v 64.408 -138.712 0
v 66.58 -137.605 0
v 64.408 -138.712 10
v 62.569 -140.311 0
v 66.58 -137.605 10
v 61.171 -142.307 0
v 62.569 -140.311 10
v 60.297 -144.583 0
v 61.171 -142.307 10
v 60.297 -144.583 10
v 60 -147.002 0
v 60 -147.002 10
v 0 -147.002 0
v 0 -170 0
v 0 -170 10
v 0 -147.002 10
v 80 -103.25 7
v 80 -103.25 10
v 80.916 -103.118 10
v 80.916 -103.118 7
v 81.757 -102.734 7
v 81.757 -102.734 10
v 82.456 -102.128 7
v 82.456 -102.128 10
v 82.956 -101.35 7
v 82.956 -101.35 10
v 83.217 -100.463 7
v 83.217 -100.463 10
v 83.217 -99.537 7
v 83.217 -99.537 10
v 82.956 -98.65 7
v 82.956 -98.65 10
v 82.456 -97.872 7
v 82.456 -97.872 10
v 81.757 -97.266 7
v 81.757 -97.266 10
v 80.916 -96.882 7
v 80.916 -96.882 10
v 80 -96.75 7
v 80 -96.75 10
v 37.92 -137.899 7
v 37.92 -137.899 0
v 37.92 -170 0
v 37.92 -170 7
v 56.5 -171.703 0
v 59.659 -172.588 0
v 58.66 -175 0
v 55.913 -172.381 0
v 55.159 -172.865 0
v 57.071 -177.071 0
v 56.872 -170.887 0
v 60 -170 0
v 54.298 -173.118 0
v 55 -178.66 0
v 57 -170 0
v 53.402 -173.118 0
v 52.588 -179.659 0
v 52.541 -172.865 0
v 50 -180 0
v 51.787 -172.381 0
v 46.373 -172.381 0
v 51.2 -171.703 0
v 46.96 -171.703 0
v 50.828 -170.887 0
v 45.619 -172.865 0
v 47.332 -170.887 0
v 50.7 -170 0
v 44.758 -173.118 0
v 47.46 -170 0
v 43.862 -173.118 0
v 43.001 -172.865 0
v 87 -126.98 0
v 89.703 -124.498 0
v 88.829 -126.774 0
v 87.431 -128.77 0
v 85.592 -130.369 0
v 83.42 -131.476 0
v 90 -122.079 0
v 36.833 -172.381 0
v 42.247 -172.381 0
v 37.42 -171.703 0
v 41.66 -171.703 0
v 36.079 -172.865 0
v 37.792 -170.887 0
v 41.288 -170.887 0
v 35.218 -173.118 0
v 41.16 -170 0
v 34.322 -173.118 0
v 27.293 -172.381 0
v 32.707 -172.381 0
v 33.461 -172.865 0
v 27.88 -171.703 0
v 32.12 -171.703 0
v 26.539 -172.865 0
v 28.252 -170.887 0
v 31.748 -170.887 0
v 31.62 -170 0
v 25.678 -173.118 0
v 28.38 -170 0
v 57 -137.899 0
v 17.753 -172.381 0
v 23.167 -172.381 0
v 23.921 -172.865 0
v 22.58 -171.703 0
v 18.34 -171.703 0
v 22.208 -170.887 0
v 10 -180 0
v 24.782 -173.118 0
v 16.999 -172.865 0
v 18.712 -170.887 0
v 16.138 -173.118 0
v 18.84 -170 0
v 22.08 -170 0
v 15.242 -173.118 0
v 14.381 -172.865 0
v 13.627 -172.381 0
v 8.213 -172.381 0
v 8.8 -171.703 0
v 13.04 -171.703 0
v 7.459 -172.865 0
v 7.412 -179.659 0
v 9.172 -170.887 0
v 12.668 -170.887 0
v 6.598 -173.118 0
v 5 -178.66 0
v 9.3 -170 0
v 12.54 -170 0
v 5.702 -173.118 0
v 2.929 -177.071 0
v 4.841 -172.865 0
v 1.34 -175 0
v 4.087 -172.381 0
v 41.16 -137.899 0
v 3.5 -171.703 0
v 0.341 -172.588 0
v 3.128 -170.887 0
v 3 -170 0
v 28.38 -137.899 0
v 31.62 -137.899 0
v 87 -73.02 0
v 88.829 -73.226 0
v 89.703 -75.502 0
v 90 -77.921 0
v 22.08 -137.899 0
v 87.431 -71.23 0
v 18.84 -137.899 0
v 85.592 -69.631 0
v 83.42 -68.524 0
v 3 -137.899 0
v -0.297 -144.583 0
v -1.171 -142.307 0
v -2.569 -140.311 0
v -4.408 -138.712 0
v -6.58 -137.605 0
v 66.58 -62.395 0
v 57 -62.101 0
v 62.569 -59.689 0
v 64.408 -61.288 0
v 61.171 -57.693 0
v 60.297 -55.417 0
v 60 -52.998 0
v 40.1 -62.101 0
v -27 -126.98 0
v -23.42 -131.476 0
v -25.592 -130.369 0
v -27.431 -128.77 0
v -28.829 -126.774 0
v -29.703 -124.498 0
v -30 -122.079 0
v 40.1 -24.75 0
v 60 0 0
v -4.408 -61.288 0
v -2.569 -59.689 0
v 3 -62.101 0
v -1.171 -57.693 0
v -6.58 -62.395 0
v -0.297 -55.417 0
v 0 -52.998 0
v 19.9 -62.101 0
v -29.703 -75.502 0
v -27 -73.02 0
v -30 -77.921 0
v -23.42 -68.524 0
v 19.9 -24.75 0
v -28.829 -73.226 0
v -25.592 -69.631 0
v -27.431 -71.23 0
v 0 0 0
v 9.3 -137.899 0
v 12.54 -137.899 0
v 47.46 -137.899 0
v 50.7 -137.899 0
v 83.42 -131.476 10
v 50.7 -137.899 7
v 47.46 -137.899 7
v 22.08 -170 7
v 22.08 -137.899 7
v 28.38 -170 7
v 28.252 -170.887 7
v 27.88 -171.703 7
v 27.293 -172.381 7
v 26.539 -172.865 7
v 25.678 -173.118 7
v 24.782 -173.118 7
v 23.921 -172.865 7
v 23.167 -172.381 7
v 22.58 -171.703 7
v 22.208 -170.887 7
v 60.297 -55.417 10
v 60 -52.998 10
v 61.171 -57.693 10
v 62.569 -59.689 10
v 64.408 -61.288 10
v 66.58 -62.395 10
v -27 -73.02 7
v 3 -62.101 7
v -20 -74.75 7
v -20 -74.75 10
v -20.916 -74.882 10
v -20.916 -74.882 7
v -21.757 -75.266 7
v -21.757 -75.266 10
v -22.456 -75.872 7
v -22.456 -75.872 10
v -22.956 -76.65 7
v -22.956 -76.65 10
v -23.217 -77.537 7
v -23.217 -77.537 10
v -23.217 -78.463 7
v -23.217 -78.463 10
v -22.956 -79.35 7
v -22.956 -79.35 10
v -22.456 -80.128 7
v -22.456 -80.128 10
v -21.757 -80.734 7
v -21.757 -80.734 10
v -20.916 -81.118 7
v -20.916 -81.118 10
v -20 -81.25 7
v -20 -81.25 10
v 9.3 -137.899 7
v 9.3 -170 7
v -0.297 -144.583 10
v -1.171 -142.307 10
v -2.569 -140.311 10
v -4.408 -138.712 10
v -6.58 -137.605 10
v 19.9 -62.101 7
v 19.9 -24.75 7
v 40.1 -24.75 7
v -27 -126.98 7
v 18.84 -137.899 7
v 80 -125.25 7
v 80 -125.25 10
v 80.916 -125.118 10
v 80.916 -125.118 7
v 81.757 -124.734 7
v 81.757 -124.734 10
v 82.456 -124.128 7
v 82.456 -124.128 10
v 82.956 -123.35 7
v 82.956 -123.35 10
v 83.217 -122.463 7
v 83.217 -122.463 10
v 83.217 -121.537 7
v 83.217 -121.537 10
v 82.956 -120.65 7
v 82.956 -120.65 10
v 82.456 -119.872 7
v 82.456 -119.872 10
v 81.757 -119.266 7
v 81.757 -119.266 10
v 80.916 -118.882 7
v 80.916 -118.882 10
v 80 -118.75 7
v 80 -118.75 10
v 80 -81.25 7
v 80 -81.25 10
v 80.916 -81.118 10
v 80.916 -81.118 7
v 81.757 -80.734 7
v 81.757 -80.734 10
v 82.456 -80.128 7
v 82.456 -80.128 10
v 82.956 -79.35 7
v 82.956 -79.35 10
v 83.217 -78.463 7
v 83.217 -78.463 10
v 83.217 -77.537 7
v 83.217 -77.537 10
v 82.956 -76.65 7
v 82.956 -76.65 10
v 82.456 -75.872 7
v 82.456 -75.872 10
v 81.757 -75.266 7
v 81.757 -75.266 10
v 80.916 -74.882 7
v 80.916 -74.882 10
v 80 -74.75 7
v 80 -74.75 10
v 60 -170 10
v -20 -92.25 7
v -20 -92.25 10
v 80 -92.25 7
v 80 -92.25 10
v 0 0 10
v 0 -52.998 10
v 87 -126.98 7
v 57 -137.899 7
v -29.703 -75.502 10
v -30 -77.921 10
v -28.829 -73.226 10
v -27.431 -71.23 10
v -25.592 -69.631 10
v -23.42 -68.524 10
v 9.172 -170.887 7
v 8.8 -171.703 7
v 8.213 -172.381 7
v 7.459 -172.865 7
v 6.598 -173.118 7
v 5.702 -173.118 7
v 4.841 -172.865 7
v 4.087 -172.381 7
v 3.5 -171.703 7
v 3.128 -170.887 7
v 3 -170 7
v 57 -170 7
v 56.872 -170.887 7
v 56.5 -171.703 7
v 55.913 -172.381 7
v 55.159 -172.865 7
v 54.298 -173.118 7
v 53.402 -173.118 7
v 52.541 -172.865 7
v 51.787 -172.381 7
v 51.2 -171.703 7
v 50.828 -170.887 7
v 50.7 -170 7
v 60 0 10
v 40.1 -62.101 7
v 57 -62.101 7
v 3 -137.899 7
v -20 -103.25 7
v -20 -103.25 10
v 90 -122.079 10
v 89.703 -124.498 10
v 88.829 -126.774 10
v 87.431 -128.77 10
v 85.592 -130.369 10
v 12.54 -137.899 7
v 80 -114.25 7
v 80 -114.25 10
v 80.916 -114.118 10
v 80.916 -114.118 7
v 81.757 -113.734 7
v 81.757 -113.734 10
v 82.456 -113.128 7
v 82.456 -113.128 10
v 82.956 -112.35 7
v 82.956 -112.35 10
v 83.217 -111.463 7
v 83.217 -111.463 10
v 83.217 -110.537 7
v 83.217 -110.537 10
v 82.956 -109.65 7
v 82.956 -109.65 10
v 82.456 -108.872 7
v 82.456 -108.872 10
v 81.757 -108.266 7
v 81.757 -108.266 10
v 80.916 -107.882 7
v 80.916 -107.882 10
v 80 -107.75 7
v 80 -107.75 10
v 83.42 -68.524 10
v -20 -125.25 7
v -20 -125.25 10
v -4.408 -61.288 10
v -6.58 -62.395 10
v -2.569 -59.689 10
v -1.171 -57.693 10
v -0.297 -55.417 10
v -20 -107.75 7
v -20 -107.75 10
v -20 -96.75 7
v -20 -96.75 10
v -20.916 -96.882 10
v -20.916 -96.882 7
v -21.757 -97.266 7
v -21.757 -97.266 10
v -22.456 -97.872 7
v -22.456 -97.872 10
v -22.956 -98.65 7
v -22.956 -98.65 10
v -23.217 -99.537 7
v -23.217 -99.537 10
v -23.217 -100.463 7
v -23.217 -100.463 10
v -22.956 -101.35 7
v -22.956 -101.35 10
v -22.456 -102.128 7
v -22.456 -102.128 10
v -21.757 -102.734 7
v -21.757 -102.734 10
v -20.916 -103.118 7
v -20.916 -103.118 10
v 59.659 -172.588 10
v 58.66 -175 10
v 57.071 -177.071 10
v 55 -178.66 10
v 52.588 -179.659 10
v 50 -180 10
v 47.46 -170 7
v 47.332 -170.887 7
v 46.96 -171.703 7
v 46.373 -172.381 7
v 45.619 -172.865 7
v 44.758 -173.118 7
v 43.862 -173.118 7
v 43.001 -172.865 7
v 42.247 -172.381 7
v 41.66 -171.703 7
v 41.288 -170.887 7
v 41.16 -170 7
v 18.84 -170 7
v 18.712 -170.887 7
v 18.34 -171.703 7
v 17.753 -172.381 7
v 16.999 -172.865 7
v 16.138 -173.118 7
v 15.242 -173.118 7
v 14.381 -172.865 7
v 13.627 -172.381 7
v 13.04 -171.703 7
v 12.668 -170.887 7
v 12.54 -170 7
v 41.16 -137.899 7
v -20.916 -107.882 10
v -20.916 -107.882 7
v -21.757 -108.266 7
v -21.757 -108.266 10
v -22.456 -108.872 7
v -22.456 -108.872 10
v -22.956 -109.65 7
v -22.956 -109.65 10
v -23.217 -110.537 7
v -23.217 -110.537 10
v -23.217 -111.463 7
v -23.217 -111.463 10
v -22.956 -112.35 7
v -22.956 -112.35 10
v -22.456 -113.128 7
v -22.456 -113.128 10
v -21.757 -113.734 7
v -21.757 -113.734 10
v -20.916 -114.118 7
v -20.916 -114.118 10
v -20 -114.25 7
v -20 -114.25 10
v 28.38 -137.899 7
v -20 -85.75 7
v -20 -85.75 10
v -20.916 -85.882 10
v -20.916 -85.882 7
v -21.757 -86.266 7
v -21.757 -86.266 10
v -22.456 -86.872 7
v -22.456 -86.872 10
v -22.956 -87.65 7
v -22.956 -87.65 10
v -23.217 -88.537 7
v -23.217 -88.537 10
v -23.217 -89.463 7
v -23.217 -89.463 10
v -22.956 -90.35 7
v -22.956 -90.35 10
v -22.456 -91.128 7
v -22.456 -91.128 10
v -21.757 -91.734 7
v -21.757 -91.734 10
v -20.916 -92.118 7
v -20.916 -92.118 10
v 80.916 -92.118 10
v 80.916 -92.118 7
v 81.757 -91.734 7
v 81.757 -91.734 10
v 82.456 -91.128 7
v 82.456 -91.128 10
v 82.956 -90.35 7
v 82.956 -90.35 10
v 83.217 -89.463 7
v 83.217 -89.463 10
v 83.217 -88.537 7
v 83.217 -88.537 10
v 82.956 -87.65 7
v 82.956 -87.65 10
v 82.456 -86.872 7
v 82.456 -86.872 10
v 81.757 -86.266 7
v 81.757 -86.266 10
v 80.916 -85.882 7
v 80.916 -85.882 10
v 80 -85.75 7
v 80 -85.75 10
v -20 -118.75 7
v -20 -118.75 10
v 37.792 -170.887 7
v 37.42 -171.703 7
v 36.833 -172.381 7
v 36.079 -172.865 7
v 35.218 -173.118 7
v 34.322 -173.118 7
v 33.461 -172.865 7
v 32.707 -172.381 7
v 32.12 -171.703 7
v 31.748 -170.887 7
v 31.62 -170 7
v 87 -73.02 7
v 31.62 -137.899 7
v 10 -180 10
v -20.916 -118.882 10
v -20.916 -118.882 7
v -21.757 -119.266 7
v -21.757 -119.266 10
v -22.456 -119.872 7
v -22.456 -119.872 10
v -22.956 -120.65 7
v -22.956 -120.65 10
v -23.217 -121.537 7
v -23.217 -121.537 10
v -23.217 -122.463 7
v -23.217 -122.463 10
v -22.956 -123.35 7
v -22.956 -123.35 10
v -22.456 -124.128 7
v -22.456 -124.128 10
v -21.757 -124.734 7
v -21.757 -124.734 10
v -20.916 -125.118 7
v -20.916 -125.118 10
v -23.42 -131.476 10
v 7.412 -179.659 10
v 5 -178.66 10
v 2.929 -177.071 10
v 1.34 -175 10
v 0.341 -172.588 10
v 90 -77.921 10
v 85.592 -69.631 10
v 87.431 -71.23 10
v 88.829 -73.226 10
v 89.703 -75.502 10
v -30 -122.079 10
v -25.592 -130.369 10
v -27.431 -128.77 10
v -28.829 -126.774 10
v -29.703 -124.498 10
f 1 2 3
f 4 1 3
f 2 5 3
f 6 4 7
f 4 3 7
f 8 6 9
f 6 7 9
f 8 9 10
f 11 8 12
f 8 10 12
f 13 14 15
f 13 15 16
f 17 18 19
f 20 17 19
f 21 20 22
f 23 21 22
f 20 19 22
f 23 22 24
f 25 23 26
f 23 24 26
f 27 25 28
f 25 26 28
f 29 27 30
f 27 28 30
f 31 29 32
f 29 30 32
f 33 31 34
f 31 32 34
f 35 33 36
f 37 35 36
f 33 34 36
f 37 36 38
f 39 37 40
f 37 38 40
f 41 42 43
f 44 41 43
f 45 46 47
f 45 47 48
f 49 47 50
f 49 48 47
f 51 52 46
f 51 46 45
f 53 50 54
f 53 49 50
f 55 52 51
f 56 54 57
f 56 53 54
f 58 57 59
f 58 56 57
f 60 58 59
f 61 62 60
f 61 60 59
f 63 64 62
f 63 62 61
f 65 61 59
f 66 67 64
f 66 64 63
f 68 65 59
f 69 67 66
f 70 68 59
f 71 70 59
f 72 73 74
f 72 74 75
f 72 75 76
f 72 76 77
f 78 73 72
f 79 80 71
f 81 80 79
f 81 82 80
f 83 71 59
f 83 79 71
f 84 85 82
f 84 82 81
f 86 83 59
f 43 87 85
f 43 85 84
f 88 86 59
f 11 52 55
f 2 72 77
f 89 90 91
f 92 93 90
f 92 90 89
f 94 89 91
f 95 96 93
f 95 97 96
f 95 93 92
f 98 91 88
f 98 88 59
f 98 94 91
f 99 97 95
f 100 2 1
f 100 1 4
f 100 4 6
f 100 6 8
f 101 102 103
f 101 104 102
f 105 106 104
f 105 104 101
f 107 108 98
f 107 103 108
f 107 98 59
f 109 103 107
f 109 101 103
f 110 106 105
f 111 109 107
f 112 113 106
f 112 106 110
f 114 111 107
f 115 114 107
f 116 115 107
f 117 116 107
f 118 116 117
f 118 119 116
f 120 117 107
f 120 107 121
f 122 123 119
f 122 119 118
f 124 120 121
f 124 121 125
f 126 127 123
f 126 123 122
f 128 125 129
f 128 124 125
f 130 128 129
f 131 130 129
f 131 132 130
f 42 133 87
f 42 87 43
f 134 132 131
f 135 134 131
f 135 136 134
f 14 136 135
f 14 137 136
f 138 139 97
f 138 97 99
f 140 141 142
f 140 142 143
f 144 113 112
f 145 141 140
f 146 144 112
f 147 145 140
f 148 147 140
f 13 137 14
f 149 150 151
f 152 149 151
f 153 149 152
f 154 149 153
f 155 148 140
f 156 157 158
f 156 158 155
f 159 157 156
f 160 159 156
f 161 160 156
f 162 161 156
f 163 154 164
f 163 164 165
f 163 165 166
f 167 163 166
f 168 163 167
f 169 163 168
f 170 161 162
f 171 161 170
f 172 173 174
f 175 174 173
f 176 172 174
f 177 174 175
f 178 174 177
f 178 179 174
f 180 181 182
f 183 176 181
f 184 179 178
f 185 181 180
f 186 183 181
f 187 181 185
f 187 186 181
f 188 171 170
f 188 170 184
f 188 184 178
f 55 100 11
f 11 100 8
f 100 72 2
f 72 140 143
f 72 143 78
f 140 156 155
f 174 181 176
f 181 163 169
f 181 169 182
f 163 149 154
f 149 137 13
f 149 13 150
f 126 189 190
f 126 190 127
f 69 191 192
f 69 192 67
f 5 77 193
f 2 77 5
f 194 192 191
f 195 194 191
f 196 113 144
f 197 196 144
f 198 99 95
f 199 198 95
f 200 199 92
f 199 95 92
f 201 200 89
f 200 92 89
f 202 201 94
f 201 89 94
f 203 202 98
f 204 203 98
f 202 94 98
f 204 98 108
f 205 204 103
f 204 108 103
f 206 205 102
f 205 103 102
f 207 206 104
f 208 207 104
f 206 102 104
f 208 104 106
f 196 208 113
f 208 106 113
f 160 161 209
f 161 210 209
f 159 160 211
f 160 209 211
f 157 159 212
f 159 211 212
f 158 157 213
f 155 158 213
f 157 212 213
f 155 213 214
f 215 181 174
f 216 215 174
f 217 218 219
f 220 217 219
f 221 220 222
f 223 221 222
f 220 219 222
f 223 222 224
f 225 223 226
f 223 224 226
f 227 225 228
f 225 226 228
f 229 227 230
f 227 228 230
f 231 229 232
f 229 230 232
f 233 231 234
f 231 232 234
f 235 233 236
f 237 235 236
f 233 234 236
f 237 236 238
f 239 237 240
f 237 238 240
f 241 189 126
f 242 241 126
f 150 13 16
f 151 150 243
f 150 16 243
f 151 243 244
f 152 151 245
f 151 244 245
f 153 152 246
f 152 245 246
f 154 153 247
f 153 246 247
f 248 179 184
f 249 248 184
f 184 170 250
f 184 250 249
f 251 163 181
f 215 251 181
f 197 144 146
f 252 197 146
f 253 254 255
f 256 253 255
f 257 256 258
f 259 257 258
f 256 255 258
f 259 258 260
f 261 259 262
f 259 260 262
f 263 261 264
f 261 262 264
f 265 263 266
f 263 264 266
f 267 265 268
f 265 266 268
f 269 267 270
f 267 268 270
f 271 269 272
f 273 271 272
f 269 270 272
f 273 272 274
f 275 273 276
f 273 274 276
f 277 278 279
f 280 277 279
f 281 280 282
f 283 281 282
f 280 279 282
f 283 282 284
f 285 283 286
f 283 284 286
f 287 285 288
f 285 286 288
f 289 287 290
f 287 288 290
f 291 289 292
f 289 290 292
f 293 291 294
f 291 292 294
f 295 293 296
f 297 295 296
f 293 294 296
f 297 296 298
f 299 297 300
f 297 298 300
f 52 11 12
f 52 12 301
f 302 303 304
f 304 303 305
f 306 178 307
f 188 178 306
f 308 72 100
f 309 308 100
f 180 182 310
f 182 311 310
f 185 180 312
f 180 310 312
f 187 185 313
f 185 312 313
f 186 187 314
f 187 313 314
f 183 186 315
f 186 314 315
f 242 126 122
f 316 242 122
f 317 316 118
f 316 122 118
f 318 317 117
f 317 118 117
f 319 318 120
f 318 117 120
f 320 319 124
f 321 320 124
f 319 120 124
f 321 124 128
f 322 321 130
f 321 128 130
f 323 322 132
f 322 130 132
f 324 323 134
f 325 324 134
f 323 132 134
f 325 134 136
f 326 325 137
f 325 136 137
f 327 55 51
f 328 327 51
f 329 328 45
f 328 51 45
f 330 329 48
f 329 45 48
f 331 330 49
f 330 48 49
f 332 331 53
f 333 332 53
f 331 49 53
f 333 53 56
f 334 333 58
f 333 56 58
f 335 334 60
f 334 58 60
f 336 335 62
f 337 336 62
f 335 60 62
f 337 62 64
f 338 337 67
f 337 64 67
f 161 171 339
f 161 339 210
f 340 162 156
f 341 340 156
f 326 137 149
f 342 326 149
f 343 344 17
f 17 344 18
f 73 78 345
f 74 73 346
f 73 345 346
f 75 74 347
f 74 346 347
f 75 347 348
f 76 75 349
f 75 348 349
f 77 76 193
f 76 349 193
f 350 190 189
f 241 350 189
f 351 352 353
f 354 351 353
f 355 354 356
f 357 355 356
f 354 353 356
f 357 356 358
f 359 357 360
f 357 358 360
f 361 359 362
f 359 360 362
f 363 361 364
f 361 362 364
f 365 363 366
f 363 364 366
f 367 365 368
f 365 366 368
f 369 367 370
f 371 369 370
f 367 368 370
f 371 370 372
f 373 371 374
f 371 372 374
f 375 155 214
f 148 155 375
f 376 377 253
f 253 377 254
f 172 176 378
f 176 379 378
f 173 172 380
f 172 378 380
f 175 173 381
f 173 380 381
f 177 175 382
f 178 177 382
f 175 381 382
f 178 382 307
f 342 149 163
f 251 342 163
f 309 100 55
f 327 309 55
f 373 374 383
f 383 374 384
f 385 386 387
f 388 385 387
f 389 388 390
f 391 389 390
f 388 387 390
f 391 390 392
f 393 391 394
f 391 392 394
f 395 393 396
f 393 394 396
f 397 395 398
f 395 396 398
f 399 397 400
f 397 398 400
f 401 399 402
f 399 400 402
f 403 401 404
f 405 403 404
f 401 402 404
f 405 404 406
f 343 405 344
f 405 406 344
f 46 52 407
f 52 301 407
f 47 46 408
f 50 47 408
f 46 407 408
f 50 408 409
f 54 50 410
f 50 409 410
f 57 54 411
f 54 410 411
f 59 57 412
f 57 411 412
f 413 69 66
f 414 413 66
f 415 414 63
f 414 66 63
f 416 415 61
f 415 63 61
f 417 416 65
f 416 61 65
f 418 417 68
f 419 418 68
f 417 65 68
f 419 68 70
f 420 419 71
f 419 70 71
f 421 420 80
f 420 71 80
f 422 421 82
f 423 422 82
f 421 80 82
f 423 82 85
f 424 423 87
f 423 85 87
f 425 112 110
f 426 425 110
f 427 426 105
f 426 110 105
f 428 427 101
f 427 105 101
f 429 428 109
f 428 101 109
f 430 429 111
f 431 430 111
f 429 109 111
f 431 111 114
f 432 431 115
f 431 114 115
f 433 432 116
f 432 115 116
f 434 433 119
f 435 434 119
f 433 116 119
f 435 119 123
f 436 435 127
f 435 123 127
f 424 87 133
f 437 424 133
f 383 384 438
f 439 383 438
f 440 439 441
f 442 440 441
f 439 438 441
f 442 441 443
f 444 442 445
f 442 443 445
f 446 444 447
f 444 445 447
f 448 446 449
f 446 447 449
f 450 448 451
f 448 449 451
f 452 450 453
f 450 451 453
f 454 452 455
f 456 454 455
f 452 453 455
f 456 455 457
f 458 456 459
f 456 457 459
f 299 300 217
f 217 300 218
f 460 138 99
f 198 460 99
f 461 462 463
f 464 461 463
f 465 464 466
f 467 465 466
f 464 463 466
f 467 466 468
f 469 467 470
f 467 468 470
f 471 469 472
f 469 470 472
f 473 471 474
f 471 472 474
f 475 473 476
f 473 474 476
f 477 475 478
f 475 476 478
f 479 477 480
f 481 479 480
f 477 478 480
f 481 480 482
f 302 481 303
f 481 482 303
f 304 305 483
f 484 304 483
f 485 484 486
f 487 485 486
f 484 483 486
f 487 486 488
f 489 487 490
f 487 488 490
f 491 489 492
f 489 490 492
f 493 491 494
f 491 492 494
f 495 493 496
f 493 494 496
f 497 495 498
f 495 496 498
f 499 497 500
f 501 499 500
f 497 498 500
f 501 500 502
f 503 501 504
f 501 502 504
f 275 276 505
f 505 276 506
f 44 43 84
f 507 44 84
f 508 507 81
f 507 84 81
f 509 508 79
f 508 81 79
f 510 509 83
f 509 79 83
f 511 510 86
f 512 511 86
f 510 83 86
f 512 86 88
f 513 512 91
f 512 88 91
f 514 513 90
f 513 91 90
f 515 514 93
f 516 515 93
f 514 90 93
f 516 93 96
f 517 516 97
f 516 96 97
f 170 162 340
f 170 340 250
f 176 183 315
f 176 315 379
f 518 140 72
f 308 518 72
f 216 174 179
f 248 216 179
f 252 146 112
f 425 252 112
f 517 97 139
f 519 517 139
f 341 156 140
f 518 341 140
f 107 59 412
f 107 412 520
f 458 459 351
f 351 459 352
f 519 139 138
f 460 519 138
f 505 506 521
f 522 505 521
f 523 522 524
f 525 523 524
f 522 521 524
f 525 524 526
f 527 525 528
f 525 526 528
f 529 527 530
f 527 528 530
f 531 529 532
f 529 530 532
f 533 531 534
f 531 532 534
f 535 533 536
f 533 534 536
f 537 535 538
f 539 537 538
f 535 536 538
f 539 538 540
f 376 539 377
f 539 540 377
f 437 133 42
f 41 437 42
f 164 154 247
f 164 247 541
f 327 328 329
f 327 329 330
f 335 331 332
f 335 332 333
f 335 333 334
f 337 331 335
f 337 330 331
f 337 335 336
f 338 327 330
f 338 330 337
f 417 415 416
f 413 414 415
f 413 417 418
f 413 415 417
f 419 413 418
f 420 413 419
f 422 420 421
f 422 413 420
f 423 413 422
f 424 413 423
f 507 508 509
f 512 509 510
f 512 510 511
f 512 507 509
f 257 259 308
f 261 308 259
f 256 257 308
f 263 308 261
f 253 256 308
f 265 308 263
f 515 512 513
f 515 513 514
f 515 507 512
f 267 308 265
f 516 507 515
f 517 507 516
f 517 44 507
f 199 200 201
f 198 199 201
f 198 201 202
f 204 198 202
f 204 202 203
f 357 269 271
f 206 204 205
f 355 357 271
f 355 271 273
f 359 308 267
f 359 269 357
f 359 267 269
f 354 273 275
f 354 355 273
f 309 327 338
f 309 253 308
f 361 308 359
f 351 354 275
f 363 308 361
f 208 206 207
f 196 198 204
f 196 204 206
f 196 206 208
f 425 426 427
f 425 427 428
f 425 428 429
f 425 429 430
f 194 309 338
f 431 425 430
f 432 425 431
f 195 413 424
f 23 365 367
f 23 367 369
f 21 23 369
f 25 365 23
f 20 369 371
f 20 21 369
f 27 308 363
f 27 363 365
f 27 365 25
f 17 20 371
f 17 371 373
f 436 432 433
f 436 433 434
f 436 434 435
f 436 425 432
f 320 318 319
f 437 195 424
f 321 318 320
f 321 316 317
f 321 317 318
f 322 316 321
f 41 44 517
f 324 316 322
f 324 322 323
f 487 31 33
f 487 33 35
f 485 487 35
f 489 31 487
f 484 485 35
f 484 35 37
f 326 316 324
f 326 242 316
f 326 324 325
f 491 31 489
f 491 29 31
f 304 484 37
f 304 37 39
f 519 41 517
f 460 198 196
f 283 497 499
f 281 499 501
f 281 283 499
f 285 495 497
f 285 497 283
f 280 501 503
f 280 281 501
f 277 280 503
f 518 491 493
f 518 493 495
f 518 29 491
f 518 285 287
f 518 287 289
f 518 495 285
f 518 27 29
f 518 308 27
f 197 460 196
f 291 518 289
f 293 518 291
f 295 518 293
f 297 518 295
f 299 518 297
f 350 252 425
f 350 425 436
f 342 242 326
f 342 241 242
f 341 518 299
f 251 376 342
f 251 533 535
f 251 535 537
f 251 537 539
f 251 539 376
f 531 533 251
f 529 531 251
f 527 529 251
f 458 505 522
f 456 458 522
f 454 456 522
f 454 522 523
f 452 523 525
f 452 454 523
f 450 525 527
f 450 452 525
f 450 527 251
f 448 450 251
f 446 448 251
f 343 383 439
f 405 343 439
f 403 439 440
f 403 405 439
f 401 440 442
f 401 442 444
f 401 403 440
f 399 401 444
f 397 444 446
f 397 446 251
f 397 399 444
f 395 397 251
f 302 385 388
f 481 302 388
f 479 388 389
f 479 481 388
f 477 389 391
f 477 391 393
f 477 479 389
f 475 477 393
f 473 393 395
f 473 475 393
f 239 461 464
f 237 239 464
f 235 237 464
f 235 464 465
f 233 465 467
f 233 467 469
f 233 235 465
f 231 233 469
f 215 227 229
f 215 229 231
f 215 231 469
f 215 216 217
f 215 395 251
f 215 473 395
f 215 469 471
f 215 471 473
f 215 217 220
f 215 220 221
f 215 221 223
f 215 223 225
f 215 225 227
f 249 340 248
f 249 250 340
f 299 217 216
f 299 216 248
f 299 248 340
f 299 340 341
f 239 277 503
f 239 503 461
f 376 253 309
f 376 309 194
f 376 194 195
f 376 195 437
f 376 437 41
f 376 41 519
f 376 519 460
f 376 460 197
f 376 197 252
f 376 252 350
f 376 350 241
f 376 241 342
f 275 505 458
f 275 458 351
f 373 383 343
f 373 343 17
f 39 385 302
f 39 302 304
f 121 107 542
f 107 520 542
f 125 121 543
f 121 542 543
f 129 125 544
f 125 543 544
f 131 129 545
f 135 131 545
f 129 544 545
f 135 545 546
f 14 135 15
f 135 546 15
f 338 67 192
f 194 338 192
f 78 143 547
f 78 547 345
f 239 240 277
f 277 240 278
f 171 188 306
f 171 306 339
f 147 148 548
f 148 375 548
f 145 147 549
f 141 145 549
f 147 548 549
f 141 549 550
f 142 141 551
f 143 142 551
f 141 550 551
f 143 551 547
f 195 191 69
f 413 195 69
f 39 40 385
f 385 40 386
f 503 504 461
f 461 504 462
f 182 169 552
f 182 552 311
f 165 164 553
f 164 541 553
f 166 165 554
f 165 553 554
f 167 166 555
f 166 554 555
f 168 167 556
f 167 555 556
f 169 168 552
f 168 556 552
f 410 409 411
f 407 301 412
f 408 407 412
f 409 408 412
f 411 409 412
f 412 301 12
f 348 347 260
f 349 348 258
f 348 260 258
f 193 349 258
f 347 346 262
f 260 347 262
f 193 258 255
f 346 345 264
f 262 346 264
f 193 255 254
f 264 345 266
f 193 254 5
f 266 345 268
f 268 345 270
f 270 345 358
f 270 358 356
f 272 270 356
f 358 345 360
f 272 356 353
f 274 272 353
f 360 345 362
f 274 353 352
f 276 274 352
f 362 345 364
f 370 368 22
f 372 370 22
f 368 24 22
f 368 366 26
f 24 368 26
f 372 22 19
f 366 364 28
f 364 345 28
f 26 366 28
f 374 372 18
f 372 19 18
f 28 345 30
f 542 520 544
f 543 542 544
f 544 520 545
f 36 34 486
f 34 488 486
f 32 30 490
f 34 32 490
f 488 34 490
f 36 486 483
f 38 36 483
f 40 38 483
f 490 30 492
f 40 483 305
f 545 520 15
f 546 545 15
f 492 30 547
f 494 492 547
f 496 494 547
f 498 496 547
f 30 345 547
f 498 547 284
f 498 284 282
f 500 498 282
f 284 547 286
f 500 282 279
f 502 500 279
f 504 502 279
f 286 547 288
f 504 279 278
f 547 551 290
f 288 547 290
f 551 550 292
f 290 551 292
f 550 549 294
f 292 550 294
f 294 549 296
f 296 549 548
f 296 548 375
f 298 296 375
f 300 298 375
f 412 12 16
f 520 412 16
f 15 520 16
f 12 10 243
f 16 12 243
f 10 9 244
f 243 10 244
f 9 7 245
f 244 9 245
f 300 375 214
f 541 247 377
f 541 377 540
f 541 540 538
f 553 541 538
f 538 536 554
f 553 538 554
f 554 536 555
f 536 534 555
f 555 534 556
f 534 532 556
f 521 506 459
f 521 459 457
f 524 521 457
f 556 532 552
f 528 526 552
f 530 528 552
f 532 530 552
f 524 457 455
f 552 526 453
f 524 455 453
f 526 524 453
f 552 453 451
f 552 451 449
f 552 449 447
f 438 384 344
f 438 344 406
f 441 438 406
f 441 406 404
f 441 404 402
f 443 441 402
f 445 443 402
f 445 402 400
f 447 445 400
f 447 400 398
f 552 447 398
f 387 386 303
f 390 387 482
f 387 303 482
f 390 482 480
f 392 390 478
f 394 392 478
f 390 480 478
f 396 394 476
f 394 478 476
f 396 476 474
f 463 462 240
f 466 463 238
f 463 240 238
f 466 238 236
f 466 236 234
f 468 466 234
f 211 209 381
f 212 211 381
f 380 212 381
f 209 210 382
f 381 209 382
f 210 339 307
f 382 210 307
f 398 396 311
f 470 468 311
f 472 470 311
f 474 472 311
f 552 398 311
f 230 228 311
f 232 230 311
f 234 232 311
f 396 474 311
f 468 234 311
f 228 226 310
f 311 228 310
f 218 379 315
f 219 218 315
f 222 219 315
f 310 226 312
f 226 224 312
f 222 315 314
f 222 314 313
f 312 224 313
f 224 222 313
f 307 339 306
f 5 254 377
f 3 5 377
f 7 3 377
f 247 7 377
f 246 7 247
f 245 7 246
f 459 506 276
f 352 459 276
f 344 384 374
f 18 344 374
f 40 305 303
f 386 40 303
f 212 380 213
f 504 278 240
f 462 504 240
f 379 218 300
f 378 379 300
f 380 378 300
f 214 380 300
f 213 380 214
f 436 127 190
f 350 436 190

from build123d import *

# Parameters (mm, degrees)
EXTRUDE_1_DEPTH     = 10
FILLET_1_R          = 10
CUT_EXTRUDE_1_DEPTH = 211.475651798
CUT_EXTRUDE_2_DEPTH = 7
SKETCH_4_W          = 20.2
SKETCH_4_H          = 40
CUT_EXTRUDE_3_DEPTH = 7
CUT_EXTRUDE_4_DEPTH = 7


with BuildPart() as part:
    # Эскиз1 → Бобышка-Вытянуть1 (new body)
    with BuildSketch(Plane.XY):
        Polygon((0, 0), (60, 0), (60, -60), (90, -70.919107028), (90, -129.080892972), (60, -140), (60, -180), (0, -180), (0, -140), (-30, -129.080892972), (-30, -70.919107028), (0, -60), align=None)
    extrude(amount=EXTRUDE_1_DEPTH)

    # Скругление1
    fillet_1_edges = [part.edges().sort_by_distance(p)[0] for p in [
        (60, -60, 5),
        (90, -70.919107028, 5),
        (90, -129.080892972, 5),
        (60, -140, 5),
        (60, -180, 5),
        (0, -180, 5),
        (0, -140, 5),
        (-30, -129.080892972, 5),
        (-30, -70.919107028, 5),
        (0, -60, 5),
    ]]
    fillet(fillet_1_edges, radius=FILLET_1_R)

    # Эскиз2 → Вырез-Вытянуть1 (cut, through all)
    with BuildSketch(Plane(origin=(0, 10, 10), x_dir=(-1, 0, 0), z_dir=(0, 0, 1))):
        with BuildLine():
            Line((20, 102.25), (-80, 102.25))
            ThreePointArc((-80, 102.25), (-83.25, 99), (-80, 95.75))
            Line((-80, 95.75), (20, 95.75))
            ThreePointArc((20, 95.75), (23.25, 99), (20, 102.25))
        make_face()
        with BuildLine():
            Line((20, 91.25), (-80, 91.25))
            ThreePointArc((-80, 91.25), (-83.25, 88), (-80, 84.75))
            Line((-80, 84.75), (20, 84.75))
            ThreePointArc((20, 84.75), (23.25, 88), (20, 91.25))
        make_face()
        with BuildLine():
            Line((20, 113.25), (-80, 113.25))
            ThreePointArc((-80, 113.25), (-83.25, 110), (-80, 106.75))
            Line((-80, 106.75), (20, 106.75))
            ThreePointArc((20, 106.75), (23.25, 110), (20, 113.25))
        make_face()
        with BuildLine():
            Line((20, 124.25), (-80, 124.25))
            ThreePointArc((-80, 124.25), (-83.25, 121), (-80, 117.75))
            Line((-80, 117.75), (20, 117.75))
            ThreePointArc((20, 117.75), (23.25, 121), (20, 124.25))
        make_face()
        with BuildLine():
            Line((20, 135.25), (-80, 135.25))
            ThreePointArc((-80, 135.25), (-83.25, 132), (-80, 128.75))
            Line((-80, 128.75), (20, 128.75))
            ThreePointArc((20, 128.75), (23.25, 132), (20, 135.25))
        make_face()
    extrude(amount=-CUT_EXTRUDE_1_DEPTH, mode=Mode.SUBTRACT)

    # Эскиз3 → Вырез-Вытянуть2 (cut)
    with BuildSketch(Plane(origin=(0, 0, 0), x_dir=(-1, 0, 0), z_dir=(0, 0, -1))):
        Polygon((-57, -137.899377385), (-3, -137.899377385), (27, -126.980270357), (27, -73.019729643), (-3, -62.100622615), (-57, -62.100622615), (-87, -73.019729643), (-87, -126.980270357), align=None)
    extrude(amount=-CUT_EXTRUDE_2_DEPTH, mode=Mode.SUBTRACT)

    # Эскиз4 → Вырез-Вытянуть3 (cut)
    with BuildSketch(Plane(origin=(0, 0, 0), x_dir=(-1, 0, 0), z_dir=(0, 0, -1))):
        with Locations((-30, -44.75)):
            Rectangle(SKETCH_4_W, SKETCH_4_H)
    extrude(amount=-CUT_EXTRUDE_3_DEPTH, mode=Mode.SUBTRACT)

    # Эскиз6 → Вырез-Вытянуть4 (cut)
    with BuildSketch(Plane(origin=(0, 0, 0), x_dir=(-1, 0, 0), z_dir=(0, 0, -1))):
        with BuildLine():
            Line((-57, -135), (-57, -170))
            ThreePointArc((-57, -170), (-53.85, -173.15), (-50.7, -170))
            Line((-50.7, -170), (-50.7, -135))
            ThreePointArc((-50.7, -135), (-53.85, -131.85), (-57, -135))
        make_face()
        with BuildLine():
            Line((-47.46, -135), (-47.46, -170))
            ThreePointArc((-47.46, -170), (-44.31, -173.15), (-41.16, -170))
            Line((-41.16, -170), (-41.16, -135))
            ThreePointArc((-41.16, -135), (-44.31, -131.85), (-47.46, -135))
        make_face()
        with BuildLine():
            Line((-37.92, -135), (-37.92, -170))
            ThreePointArc((-37.92, -170), (-34.77, -173.15), (-31.62, -170))
            Line((-31.62, -170), (-31.62, -135))
            ThreePointArc((-31.62, -135), (-34.77, -131.85), (-37.92, -135))
        make_face()
        with BuildLine():
            Line((-28.38, -135), (-28.38, -170))
            ThreePointArc((-28.38, -170), (-25.23, -173.15), (-22.08, -170))
            Line((-22.08, -170), (-22.08, -135))
            ThreePointArc((-22.08, -135), (-25.23, -131.85), (-28.38, -135))
        make_face()
        with BuildLine():
            Line((-18.84, -135), (-18.84, -170))
            ThreePointArc((-18.84, -170), (-15.69, -173.15), (-12.54, -170))
            Line((-12.54, -170), (-12.54, -135))
            ThreePointArc((-12.54, -135), (-15.69, -131.85), (-18.84, -135))
        make_face()
        with BuildLine():
            Line((-9.3, -135), (-9.3, -170))
            ThreePointArc((-9.3, -170), (-6.15, -173.15), (-3, -170))
            Line((-3, -170), (-3, -135))
            ThreePointArc((-3, -135), (-6.15, -131.85), (-9.3, -135))
        make_face()
    extrude(amount=-CUT_EXTRUDE_4_DEPTH, mode=Mode.SUBTRACT)


solid = part.part
